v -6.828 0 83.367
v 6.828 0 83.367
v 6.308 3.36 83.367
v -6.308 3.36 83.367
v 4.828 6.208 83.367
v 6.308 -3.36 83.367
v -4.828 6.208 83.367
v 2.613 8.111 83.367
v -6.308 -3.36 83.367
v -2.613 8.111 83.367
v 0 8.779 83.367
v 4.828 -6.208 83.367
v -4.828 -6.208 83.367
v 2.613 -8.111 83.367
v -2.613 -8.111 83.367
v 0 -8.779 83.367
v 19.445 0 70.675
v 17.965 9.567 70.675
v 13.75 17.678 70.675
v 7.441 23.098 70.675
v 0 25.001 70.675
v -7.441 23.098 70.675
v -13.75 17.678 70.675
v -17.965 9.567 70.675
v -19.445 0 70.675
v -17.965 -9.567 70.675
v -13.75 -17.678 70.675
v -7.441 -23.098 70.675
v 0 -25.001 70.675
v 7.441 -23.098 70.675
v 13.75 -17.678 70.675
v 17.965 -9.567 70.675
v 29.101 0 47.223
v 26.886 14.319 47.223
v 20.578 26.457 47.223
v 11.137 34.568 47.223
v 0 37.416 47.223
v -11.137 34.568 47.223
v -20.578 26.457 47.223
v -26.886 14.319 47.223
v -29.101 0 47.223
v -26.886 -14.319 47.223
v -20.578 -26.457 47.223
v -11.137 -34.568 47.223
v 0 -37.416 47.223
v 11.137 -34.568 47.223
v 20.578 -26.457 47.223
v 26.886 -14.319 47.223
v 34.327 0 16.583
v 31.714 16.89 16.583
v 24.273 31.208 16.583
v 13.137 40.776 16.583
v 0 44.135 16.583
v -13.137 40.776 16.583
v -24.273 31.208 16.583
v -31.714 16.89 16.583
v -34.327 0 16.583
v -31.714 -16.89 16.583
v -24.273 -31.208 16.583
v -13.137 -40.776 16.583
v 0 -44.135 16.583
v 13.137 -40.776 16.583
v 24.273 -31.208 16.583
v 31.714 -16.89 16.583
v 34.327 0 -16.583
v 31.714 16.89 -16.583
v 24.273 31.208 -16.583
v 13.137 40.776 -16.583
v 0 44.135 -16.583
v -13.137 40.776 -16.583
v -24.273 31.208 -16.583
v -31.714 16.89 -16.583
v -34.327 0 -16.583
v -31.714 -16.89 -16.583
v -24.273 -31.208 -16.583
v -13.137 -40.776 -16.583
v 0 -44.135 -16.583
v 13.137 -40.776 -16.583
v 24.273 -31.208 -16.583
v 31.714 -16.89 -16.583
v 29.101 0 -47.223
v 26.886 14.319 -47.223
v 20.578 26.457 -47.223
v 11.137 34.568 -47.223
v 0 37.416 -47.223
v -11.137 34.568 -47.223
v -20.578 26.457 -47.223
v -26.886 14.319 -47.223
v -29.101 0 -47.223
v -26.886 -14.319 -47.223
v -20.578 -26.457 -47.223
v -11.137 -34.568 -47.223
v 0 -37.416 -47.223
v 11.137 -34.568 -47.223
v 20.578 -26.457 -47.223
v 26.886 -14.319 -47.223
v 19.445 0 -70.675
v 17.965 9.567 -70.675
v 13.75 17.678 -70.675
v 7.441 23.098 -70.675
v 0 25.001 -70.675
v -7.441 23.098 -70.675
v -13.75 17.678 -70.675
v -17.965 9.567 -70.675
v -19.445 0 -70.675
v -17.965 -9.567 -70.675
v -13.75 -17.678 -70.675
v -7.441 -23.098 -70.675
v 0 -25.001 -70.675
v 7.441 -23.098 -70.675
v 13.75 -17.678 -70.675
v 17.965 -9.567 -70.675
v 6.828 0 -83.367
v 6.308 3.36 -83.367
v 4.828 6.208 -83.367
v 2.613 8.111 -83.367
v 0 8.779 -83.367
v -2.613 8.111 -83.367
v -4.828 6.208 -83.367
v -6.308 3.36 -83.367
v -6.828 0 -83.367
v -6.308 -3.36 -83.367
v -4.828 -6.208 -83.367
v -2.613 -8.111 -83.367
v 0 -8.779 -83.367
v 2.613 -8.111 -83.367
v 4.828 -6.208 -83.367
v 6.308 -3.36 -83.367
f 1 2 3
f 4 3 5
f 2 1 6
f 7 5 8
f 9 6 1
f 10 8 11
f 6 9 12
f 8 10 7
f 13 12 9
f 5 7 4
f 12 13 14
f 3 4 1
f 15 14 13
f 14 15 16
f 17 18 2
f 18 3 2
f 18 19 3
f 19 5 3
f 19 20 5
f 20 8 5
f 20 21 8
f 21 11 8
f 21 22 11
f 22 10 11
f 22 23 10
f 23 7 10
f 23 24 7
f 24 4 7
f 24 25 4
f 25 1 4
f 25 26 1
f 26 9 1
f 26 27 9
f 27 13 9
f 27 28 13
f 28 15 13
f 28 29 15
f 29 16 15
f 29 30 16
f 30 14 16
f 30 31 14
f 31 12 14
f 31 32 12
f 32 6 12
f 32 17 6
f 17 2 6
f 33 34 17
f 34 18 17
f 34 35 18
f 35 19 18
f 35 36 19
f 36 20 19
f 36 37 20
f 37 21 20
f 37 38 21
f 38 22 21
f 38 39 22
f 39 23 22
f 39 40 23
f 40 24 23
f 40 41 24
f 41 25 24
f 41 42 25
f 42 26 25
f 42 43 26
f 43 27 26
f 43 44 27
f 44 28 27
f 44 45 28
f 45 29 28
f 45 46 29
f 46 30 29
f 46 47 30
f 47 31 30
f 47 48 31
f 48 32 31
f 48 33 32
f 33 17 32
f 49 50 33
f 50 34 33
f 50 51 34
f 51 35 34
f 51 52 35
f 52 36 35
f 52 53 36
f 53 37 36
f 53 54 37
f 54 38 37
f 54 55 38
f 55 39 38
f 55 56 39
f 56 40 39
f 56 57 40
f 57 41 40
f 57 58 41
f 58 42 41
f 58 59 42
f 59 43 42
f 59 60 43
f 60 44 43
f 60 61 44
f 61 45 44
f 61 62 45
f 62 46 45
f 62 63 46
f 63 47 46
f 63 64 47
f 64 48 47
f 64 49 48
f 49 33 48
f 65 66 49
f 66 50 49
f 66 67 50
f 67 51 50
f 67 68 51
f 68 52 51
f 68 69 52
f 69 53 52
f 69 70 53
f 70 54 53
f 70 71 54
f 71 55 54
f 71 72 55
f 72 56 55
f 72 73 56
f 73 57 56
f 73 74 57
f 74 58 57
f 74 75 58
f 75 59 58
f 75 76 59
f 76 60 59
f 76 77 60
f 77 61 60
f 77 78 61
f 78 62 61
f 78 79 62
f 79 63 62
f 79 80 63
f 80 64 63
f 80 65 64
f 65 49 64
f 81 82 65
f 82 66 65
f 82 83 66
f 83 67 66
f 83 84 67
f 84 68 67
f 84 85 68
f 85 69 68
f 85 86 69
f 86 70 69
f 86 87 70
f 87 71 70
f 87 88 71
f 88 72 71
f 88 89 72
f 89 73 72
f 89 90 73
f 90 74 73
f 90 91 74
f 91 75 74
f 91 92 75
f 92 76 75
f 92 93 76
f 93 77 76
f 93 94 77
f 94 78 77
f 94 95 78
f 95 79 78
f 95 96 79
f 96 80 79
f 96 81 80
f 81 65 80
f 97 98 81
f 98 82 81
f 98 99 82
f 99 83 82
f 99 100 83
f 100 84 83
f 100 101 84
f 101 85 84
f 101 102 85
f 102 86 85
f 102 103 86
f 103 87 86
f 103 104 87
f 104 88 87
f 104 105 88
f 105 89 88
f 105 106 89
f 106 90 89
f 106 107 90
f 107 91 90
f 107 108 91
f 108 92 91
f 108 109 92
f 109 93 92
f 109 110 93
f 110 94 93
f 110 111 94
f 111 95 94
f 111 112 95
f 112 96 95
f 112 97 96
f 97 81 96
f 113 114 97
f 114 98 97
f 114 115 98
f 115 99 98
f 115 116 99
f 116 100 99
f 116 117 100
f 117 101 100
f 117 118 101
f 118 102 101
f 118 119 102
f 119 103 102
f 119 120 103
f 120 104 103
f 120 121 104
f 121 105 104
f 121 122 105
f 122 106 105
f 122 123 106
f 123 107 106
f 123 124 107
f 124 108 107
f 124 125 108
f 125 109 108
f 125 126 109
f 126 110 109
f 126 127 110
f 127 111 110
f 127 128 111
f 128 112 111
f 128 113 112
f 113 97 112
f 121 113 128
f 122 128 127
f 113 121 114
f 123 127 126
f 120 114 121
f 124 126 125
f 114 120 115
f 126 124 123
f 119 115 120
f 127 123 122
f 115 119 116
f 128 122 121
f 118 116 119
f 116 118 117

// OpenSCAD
// Generated by SolidPython 1.0.1 on 2020-07-29 00:46:47


scale(v = [7, 9, 17]) {
	sphere(r = 5);
}
/***********************************************
*********      SolidPython code:      **********
************************************************
 
# import packages: SolidPython
from solid import *
from solid.utils import *
from itertools import chain, combinations, permutations


class Resize:

    def __init__(self, scad_file):
        self.scad_file = scad_file
        #self.scad_file = import_scad(scad_file)
        # cone/cylinder param:
        self.r1 = 0
        self.r2 = 0
        self.h = 0
        # rectangular prism param:
        self.w = 0
        self.l = 0
        # ellipse param:
        self.r = 0

    # import OpenScad code (file name corresponds to shape)


    # classify shape + parameters
    def assign(self, param1, param2, param3):
        if self.scad_file == 'cone.scad':
            self.r1 = param1
            self.r2 = param2
            self.h = param3
        elif self.scad_file == 'cylinder.scad':
            self.r1 = param1
            self.r2 = param2
            self.h = param3
        elif self.scad_file == 'rectangularPrism.scad':
            self.h = param1
            self.l = param2
            self.w = param3
        else:
            self.r = param1
            self.h = param2

    # resize parameters
    def iterate(self):
        x = range(3, 20, 2)
        i = 1
        if self.scad_file == 'cone.scad':
            tempList = list(permutations(x, 2))
            for temp in tempList:
                param1 = temp[0]
                param2 = temp[1]
                filepath = 'produced_scad_files/' + 'cone' + str(param1) + '_' + str(param2) + '_' + '.scad'
                scad_render_to_file(cylinder(h=param1, r1=param2, r2=0), filepath)

        elif self.scad_file == 'cylinder.scad':
            tempList = list(permutations(x, 3))
            for temp in tempList:
                param1 = temp[0]
                param2 = temp[1]
                filepath = 'produced_scad_files/' + 'cylinder' + str(param1) + '_' + str(param2) + '_' + '.scad'
                scad_render_to_file(cylinder(h=param1, r1=param2, r2=param2), filepath)

        elif self.scad_file == 'rectangularPrism.scad':
            tempList = list(permutations(x, 3))
            for temp in tempList:
                param1 = temp[0]
                param2 = temp[1]
                param3 = temp[2]
                filepath = 'produced_scad_files/' + 'rectangularPrism' + str(param1) + '_' + str(param2) + '_' + str(
                    param3) + '.scad'
                scad_render_to_file(cube(size=(param1, param2, param3)), filepath)

        elif self.scad_file == 'ellipse.scad':
            tempList = list(permutations(x, 4))
            for temp in tempList:
                param1 = temp[0]
                param2 = temp[1]
                param3 = temp[2]
                param4 = temp[3]
                filepath = 'produced_scad_files/' + 'ellipse' + str(param1) + '_' + str(param2) + '_' + str(param3) + '_' + str(param4) + '.scad'
                scad_render_to_file(scale([param1, param2, param3])(sphere(r=param4)), filepath)

    def render_to_scadfile(self):
        scad_render_to_file(scad, 'example.scad') 
 
************************************************/
